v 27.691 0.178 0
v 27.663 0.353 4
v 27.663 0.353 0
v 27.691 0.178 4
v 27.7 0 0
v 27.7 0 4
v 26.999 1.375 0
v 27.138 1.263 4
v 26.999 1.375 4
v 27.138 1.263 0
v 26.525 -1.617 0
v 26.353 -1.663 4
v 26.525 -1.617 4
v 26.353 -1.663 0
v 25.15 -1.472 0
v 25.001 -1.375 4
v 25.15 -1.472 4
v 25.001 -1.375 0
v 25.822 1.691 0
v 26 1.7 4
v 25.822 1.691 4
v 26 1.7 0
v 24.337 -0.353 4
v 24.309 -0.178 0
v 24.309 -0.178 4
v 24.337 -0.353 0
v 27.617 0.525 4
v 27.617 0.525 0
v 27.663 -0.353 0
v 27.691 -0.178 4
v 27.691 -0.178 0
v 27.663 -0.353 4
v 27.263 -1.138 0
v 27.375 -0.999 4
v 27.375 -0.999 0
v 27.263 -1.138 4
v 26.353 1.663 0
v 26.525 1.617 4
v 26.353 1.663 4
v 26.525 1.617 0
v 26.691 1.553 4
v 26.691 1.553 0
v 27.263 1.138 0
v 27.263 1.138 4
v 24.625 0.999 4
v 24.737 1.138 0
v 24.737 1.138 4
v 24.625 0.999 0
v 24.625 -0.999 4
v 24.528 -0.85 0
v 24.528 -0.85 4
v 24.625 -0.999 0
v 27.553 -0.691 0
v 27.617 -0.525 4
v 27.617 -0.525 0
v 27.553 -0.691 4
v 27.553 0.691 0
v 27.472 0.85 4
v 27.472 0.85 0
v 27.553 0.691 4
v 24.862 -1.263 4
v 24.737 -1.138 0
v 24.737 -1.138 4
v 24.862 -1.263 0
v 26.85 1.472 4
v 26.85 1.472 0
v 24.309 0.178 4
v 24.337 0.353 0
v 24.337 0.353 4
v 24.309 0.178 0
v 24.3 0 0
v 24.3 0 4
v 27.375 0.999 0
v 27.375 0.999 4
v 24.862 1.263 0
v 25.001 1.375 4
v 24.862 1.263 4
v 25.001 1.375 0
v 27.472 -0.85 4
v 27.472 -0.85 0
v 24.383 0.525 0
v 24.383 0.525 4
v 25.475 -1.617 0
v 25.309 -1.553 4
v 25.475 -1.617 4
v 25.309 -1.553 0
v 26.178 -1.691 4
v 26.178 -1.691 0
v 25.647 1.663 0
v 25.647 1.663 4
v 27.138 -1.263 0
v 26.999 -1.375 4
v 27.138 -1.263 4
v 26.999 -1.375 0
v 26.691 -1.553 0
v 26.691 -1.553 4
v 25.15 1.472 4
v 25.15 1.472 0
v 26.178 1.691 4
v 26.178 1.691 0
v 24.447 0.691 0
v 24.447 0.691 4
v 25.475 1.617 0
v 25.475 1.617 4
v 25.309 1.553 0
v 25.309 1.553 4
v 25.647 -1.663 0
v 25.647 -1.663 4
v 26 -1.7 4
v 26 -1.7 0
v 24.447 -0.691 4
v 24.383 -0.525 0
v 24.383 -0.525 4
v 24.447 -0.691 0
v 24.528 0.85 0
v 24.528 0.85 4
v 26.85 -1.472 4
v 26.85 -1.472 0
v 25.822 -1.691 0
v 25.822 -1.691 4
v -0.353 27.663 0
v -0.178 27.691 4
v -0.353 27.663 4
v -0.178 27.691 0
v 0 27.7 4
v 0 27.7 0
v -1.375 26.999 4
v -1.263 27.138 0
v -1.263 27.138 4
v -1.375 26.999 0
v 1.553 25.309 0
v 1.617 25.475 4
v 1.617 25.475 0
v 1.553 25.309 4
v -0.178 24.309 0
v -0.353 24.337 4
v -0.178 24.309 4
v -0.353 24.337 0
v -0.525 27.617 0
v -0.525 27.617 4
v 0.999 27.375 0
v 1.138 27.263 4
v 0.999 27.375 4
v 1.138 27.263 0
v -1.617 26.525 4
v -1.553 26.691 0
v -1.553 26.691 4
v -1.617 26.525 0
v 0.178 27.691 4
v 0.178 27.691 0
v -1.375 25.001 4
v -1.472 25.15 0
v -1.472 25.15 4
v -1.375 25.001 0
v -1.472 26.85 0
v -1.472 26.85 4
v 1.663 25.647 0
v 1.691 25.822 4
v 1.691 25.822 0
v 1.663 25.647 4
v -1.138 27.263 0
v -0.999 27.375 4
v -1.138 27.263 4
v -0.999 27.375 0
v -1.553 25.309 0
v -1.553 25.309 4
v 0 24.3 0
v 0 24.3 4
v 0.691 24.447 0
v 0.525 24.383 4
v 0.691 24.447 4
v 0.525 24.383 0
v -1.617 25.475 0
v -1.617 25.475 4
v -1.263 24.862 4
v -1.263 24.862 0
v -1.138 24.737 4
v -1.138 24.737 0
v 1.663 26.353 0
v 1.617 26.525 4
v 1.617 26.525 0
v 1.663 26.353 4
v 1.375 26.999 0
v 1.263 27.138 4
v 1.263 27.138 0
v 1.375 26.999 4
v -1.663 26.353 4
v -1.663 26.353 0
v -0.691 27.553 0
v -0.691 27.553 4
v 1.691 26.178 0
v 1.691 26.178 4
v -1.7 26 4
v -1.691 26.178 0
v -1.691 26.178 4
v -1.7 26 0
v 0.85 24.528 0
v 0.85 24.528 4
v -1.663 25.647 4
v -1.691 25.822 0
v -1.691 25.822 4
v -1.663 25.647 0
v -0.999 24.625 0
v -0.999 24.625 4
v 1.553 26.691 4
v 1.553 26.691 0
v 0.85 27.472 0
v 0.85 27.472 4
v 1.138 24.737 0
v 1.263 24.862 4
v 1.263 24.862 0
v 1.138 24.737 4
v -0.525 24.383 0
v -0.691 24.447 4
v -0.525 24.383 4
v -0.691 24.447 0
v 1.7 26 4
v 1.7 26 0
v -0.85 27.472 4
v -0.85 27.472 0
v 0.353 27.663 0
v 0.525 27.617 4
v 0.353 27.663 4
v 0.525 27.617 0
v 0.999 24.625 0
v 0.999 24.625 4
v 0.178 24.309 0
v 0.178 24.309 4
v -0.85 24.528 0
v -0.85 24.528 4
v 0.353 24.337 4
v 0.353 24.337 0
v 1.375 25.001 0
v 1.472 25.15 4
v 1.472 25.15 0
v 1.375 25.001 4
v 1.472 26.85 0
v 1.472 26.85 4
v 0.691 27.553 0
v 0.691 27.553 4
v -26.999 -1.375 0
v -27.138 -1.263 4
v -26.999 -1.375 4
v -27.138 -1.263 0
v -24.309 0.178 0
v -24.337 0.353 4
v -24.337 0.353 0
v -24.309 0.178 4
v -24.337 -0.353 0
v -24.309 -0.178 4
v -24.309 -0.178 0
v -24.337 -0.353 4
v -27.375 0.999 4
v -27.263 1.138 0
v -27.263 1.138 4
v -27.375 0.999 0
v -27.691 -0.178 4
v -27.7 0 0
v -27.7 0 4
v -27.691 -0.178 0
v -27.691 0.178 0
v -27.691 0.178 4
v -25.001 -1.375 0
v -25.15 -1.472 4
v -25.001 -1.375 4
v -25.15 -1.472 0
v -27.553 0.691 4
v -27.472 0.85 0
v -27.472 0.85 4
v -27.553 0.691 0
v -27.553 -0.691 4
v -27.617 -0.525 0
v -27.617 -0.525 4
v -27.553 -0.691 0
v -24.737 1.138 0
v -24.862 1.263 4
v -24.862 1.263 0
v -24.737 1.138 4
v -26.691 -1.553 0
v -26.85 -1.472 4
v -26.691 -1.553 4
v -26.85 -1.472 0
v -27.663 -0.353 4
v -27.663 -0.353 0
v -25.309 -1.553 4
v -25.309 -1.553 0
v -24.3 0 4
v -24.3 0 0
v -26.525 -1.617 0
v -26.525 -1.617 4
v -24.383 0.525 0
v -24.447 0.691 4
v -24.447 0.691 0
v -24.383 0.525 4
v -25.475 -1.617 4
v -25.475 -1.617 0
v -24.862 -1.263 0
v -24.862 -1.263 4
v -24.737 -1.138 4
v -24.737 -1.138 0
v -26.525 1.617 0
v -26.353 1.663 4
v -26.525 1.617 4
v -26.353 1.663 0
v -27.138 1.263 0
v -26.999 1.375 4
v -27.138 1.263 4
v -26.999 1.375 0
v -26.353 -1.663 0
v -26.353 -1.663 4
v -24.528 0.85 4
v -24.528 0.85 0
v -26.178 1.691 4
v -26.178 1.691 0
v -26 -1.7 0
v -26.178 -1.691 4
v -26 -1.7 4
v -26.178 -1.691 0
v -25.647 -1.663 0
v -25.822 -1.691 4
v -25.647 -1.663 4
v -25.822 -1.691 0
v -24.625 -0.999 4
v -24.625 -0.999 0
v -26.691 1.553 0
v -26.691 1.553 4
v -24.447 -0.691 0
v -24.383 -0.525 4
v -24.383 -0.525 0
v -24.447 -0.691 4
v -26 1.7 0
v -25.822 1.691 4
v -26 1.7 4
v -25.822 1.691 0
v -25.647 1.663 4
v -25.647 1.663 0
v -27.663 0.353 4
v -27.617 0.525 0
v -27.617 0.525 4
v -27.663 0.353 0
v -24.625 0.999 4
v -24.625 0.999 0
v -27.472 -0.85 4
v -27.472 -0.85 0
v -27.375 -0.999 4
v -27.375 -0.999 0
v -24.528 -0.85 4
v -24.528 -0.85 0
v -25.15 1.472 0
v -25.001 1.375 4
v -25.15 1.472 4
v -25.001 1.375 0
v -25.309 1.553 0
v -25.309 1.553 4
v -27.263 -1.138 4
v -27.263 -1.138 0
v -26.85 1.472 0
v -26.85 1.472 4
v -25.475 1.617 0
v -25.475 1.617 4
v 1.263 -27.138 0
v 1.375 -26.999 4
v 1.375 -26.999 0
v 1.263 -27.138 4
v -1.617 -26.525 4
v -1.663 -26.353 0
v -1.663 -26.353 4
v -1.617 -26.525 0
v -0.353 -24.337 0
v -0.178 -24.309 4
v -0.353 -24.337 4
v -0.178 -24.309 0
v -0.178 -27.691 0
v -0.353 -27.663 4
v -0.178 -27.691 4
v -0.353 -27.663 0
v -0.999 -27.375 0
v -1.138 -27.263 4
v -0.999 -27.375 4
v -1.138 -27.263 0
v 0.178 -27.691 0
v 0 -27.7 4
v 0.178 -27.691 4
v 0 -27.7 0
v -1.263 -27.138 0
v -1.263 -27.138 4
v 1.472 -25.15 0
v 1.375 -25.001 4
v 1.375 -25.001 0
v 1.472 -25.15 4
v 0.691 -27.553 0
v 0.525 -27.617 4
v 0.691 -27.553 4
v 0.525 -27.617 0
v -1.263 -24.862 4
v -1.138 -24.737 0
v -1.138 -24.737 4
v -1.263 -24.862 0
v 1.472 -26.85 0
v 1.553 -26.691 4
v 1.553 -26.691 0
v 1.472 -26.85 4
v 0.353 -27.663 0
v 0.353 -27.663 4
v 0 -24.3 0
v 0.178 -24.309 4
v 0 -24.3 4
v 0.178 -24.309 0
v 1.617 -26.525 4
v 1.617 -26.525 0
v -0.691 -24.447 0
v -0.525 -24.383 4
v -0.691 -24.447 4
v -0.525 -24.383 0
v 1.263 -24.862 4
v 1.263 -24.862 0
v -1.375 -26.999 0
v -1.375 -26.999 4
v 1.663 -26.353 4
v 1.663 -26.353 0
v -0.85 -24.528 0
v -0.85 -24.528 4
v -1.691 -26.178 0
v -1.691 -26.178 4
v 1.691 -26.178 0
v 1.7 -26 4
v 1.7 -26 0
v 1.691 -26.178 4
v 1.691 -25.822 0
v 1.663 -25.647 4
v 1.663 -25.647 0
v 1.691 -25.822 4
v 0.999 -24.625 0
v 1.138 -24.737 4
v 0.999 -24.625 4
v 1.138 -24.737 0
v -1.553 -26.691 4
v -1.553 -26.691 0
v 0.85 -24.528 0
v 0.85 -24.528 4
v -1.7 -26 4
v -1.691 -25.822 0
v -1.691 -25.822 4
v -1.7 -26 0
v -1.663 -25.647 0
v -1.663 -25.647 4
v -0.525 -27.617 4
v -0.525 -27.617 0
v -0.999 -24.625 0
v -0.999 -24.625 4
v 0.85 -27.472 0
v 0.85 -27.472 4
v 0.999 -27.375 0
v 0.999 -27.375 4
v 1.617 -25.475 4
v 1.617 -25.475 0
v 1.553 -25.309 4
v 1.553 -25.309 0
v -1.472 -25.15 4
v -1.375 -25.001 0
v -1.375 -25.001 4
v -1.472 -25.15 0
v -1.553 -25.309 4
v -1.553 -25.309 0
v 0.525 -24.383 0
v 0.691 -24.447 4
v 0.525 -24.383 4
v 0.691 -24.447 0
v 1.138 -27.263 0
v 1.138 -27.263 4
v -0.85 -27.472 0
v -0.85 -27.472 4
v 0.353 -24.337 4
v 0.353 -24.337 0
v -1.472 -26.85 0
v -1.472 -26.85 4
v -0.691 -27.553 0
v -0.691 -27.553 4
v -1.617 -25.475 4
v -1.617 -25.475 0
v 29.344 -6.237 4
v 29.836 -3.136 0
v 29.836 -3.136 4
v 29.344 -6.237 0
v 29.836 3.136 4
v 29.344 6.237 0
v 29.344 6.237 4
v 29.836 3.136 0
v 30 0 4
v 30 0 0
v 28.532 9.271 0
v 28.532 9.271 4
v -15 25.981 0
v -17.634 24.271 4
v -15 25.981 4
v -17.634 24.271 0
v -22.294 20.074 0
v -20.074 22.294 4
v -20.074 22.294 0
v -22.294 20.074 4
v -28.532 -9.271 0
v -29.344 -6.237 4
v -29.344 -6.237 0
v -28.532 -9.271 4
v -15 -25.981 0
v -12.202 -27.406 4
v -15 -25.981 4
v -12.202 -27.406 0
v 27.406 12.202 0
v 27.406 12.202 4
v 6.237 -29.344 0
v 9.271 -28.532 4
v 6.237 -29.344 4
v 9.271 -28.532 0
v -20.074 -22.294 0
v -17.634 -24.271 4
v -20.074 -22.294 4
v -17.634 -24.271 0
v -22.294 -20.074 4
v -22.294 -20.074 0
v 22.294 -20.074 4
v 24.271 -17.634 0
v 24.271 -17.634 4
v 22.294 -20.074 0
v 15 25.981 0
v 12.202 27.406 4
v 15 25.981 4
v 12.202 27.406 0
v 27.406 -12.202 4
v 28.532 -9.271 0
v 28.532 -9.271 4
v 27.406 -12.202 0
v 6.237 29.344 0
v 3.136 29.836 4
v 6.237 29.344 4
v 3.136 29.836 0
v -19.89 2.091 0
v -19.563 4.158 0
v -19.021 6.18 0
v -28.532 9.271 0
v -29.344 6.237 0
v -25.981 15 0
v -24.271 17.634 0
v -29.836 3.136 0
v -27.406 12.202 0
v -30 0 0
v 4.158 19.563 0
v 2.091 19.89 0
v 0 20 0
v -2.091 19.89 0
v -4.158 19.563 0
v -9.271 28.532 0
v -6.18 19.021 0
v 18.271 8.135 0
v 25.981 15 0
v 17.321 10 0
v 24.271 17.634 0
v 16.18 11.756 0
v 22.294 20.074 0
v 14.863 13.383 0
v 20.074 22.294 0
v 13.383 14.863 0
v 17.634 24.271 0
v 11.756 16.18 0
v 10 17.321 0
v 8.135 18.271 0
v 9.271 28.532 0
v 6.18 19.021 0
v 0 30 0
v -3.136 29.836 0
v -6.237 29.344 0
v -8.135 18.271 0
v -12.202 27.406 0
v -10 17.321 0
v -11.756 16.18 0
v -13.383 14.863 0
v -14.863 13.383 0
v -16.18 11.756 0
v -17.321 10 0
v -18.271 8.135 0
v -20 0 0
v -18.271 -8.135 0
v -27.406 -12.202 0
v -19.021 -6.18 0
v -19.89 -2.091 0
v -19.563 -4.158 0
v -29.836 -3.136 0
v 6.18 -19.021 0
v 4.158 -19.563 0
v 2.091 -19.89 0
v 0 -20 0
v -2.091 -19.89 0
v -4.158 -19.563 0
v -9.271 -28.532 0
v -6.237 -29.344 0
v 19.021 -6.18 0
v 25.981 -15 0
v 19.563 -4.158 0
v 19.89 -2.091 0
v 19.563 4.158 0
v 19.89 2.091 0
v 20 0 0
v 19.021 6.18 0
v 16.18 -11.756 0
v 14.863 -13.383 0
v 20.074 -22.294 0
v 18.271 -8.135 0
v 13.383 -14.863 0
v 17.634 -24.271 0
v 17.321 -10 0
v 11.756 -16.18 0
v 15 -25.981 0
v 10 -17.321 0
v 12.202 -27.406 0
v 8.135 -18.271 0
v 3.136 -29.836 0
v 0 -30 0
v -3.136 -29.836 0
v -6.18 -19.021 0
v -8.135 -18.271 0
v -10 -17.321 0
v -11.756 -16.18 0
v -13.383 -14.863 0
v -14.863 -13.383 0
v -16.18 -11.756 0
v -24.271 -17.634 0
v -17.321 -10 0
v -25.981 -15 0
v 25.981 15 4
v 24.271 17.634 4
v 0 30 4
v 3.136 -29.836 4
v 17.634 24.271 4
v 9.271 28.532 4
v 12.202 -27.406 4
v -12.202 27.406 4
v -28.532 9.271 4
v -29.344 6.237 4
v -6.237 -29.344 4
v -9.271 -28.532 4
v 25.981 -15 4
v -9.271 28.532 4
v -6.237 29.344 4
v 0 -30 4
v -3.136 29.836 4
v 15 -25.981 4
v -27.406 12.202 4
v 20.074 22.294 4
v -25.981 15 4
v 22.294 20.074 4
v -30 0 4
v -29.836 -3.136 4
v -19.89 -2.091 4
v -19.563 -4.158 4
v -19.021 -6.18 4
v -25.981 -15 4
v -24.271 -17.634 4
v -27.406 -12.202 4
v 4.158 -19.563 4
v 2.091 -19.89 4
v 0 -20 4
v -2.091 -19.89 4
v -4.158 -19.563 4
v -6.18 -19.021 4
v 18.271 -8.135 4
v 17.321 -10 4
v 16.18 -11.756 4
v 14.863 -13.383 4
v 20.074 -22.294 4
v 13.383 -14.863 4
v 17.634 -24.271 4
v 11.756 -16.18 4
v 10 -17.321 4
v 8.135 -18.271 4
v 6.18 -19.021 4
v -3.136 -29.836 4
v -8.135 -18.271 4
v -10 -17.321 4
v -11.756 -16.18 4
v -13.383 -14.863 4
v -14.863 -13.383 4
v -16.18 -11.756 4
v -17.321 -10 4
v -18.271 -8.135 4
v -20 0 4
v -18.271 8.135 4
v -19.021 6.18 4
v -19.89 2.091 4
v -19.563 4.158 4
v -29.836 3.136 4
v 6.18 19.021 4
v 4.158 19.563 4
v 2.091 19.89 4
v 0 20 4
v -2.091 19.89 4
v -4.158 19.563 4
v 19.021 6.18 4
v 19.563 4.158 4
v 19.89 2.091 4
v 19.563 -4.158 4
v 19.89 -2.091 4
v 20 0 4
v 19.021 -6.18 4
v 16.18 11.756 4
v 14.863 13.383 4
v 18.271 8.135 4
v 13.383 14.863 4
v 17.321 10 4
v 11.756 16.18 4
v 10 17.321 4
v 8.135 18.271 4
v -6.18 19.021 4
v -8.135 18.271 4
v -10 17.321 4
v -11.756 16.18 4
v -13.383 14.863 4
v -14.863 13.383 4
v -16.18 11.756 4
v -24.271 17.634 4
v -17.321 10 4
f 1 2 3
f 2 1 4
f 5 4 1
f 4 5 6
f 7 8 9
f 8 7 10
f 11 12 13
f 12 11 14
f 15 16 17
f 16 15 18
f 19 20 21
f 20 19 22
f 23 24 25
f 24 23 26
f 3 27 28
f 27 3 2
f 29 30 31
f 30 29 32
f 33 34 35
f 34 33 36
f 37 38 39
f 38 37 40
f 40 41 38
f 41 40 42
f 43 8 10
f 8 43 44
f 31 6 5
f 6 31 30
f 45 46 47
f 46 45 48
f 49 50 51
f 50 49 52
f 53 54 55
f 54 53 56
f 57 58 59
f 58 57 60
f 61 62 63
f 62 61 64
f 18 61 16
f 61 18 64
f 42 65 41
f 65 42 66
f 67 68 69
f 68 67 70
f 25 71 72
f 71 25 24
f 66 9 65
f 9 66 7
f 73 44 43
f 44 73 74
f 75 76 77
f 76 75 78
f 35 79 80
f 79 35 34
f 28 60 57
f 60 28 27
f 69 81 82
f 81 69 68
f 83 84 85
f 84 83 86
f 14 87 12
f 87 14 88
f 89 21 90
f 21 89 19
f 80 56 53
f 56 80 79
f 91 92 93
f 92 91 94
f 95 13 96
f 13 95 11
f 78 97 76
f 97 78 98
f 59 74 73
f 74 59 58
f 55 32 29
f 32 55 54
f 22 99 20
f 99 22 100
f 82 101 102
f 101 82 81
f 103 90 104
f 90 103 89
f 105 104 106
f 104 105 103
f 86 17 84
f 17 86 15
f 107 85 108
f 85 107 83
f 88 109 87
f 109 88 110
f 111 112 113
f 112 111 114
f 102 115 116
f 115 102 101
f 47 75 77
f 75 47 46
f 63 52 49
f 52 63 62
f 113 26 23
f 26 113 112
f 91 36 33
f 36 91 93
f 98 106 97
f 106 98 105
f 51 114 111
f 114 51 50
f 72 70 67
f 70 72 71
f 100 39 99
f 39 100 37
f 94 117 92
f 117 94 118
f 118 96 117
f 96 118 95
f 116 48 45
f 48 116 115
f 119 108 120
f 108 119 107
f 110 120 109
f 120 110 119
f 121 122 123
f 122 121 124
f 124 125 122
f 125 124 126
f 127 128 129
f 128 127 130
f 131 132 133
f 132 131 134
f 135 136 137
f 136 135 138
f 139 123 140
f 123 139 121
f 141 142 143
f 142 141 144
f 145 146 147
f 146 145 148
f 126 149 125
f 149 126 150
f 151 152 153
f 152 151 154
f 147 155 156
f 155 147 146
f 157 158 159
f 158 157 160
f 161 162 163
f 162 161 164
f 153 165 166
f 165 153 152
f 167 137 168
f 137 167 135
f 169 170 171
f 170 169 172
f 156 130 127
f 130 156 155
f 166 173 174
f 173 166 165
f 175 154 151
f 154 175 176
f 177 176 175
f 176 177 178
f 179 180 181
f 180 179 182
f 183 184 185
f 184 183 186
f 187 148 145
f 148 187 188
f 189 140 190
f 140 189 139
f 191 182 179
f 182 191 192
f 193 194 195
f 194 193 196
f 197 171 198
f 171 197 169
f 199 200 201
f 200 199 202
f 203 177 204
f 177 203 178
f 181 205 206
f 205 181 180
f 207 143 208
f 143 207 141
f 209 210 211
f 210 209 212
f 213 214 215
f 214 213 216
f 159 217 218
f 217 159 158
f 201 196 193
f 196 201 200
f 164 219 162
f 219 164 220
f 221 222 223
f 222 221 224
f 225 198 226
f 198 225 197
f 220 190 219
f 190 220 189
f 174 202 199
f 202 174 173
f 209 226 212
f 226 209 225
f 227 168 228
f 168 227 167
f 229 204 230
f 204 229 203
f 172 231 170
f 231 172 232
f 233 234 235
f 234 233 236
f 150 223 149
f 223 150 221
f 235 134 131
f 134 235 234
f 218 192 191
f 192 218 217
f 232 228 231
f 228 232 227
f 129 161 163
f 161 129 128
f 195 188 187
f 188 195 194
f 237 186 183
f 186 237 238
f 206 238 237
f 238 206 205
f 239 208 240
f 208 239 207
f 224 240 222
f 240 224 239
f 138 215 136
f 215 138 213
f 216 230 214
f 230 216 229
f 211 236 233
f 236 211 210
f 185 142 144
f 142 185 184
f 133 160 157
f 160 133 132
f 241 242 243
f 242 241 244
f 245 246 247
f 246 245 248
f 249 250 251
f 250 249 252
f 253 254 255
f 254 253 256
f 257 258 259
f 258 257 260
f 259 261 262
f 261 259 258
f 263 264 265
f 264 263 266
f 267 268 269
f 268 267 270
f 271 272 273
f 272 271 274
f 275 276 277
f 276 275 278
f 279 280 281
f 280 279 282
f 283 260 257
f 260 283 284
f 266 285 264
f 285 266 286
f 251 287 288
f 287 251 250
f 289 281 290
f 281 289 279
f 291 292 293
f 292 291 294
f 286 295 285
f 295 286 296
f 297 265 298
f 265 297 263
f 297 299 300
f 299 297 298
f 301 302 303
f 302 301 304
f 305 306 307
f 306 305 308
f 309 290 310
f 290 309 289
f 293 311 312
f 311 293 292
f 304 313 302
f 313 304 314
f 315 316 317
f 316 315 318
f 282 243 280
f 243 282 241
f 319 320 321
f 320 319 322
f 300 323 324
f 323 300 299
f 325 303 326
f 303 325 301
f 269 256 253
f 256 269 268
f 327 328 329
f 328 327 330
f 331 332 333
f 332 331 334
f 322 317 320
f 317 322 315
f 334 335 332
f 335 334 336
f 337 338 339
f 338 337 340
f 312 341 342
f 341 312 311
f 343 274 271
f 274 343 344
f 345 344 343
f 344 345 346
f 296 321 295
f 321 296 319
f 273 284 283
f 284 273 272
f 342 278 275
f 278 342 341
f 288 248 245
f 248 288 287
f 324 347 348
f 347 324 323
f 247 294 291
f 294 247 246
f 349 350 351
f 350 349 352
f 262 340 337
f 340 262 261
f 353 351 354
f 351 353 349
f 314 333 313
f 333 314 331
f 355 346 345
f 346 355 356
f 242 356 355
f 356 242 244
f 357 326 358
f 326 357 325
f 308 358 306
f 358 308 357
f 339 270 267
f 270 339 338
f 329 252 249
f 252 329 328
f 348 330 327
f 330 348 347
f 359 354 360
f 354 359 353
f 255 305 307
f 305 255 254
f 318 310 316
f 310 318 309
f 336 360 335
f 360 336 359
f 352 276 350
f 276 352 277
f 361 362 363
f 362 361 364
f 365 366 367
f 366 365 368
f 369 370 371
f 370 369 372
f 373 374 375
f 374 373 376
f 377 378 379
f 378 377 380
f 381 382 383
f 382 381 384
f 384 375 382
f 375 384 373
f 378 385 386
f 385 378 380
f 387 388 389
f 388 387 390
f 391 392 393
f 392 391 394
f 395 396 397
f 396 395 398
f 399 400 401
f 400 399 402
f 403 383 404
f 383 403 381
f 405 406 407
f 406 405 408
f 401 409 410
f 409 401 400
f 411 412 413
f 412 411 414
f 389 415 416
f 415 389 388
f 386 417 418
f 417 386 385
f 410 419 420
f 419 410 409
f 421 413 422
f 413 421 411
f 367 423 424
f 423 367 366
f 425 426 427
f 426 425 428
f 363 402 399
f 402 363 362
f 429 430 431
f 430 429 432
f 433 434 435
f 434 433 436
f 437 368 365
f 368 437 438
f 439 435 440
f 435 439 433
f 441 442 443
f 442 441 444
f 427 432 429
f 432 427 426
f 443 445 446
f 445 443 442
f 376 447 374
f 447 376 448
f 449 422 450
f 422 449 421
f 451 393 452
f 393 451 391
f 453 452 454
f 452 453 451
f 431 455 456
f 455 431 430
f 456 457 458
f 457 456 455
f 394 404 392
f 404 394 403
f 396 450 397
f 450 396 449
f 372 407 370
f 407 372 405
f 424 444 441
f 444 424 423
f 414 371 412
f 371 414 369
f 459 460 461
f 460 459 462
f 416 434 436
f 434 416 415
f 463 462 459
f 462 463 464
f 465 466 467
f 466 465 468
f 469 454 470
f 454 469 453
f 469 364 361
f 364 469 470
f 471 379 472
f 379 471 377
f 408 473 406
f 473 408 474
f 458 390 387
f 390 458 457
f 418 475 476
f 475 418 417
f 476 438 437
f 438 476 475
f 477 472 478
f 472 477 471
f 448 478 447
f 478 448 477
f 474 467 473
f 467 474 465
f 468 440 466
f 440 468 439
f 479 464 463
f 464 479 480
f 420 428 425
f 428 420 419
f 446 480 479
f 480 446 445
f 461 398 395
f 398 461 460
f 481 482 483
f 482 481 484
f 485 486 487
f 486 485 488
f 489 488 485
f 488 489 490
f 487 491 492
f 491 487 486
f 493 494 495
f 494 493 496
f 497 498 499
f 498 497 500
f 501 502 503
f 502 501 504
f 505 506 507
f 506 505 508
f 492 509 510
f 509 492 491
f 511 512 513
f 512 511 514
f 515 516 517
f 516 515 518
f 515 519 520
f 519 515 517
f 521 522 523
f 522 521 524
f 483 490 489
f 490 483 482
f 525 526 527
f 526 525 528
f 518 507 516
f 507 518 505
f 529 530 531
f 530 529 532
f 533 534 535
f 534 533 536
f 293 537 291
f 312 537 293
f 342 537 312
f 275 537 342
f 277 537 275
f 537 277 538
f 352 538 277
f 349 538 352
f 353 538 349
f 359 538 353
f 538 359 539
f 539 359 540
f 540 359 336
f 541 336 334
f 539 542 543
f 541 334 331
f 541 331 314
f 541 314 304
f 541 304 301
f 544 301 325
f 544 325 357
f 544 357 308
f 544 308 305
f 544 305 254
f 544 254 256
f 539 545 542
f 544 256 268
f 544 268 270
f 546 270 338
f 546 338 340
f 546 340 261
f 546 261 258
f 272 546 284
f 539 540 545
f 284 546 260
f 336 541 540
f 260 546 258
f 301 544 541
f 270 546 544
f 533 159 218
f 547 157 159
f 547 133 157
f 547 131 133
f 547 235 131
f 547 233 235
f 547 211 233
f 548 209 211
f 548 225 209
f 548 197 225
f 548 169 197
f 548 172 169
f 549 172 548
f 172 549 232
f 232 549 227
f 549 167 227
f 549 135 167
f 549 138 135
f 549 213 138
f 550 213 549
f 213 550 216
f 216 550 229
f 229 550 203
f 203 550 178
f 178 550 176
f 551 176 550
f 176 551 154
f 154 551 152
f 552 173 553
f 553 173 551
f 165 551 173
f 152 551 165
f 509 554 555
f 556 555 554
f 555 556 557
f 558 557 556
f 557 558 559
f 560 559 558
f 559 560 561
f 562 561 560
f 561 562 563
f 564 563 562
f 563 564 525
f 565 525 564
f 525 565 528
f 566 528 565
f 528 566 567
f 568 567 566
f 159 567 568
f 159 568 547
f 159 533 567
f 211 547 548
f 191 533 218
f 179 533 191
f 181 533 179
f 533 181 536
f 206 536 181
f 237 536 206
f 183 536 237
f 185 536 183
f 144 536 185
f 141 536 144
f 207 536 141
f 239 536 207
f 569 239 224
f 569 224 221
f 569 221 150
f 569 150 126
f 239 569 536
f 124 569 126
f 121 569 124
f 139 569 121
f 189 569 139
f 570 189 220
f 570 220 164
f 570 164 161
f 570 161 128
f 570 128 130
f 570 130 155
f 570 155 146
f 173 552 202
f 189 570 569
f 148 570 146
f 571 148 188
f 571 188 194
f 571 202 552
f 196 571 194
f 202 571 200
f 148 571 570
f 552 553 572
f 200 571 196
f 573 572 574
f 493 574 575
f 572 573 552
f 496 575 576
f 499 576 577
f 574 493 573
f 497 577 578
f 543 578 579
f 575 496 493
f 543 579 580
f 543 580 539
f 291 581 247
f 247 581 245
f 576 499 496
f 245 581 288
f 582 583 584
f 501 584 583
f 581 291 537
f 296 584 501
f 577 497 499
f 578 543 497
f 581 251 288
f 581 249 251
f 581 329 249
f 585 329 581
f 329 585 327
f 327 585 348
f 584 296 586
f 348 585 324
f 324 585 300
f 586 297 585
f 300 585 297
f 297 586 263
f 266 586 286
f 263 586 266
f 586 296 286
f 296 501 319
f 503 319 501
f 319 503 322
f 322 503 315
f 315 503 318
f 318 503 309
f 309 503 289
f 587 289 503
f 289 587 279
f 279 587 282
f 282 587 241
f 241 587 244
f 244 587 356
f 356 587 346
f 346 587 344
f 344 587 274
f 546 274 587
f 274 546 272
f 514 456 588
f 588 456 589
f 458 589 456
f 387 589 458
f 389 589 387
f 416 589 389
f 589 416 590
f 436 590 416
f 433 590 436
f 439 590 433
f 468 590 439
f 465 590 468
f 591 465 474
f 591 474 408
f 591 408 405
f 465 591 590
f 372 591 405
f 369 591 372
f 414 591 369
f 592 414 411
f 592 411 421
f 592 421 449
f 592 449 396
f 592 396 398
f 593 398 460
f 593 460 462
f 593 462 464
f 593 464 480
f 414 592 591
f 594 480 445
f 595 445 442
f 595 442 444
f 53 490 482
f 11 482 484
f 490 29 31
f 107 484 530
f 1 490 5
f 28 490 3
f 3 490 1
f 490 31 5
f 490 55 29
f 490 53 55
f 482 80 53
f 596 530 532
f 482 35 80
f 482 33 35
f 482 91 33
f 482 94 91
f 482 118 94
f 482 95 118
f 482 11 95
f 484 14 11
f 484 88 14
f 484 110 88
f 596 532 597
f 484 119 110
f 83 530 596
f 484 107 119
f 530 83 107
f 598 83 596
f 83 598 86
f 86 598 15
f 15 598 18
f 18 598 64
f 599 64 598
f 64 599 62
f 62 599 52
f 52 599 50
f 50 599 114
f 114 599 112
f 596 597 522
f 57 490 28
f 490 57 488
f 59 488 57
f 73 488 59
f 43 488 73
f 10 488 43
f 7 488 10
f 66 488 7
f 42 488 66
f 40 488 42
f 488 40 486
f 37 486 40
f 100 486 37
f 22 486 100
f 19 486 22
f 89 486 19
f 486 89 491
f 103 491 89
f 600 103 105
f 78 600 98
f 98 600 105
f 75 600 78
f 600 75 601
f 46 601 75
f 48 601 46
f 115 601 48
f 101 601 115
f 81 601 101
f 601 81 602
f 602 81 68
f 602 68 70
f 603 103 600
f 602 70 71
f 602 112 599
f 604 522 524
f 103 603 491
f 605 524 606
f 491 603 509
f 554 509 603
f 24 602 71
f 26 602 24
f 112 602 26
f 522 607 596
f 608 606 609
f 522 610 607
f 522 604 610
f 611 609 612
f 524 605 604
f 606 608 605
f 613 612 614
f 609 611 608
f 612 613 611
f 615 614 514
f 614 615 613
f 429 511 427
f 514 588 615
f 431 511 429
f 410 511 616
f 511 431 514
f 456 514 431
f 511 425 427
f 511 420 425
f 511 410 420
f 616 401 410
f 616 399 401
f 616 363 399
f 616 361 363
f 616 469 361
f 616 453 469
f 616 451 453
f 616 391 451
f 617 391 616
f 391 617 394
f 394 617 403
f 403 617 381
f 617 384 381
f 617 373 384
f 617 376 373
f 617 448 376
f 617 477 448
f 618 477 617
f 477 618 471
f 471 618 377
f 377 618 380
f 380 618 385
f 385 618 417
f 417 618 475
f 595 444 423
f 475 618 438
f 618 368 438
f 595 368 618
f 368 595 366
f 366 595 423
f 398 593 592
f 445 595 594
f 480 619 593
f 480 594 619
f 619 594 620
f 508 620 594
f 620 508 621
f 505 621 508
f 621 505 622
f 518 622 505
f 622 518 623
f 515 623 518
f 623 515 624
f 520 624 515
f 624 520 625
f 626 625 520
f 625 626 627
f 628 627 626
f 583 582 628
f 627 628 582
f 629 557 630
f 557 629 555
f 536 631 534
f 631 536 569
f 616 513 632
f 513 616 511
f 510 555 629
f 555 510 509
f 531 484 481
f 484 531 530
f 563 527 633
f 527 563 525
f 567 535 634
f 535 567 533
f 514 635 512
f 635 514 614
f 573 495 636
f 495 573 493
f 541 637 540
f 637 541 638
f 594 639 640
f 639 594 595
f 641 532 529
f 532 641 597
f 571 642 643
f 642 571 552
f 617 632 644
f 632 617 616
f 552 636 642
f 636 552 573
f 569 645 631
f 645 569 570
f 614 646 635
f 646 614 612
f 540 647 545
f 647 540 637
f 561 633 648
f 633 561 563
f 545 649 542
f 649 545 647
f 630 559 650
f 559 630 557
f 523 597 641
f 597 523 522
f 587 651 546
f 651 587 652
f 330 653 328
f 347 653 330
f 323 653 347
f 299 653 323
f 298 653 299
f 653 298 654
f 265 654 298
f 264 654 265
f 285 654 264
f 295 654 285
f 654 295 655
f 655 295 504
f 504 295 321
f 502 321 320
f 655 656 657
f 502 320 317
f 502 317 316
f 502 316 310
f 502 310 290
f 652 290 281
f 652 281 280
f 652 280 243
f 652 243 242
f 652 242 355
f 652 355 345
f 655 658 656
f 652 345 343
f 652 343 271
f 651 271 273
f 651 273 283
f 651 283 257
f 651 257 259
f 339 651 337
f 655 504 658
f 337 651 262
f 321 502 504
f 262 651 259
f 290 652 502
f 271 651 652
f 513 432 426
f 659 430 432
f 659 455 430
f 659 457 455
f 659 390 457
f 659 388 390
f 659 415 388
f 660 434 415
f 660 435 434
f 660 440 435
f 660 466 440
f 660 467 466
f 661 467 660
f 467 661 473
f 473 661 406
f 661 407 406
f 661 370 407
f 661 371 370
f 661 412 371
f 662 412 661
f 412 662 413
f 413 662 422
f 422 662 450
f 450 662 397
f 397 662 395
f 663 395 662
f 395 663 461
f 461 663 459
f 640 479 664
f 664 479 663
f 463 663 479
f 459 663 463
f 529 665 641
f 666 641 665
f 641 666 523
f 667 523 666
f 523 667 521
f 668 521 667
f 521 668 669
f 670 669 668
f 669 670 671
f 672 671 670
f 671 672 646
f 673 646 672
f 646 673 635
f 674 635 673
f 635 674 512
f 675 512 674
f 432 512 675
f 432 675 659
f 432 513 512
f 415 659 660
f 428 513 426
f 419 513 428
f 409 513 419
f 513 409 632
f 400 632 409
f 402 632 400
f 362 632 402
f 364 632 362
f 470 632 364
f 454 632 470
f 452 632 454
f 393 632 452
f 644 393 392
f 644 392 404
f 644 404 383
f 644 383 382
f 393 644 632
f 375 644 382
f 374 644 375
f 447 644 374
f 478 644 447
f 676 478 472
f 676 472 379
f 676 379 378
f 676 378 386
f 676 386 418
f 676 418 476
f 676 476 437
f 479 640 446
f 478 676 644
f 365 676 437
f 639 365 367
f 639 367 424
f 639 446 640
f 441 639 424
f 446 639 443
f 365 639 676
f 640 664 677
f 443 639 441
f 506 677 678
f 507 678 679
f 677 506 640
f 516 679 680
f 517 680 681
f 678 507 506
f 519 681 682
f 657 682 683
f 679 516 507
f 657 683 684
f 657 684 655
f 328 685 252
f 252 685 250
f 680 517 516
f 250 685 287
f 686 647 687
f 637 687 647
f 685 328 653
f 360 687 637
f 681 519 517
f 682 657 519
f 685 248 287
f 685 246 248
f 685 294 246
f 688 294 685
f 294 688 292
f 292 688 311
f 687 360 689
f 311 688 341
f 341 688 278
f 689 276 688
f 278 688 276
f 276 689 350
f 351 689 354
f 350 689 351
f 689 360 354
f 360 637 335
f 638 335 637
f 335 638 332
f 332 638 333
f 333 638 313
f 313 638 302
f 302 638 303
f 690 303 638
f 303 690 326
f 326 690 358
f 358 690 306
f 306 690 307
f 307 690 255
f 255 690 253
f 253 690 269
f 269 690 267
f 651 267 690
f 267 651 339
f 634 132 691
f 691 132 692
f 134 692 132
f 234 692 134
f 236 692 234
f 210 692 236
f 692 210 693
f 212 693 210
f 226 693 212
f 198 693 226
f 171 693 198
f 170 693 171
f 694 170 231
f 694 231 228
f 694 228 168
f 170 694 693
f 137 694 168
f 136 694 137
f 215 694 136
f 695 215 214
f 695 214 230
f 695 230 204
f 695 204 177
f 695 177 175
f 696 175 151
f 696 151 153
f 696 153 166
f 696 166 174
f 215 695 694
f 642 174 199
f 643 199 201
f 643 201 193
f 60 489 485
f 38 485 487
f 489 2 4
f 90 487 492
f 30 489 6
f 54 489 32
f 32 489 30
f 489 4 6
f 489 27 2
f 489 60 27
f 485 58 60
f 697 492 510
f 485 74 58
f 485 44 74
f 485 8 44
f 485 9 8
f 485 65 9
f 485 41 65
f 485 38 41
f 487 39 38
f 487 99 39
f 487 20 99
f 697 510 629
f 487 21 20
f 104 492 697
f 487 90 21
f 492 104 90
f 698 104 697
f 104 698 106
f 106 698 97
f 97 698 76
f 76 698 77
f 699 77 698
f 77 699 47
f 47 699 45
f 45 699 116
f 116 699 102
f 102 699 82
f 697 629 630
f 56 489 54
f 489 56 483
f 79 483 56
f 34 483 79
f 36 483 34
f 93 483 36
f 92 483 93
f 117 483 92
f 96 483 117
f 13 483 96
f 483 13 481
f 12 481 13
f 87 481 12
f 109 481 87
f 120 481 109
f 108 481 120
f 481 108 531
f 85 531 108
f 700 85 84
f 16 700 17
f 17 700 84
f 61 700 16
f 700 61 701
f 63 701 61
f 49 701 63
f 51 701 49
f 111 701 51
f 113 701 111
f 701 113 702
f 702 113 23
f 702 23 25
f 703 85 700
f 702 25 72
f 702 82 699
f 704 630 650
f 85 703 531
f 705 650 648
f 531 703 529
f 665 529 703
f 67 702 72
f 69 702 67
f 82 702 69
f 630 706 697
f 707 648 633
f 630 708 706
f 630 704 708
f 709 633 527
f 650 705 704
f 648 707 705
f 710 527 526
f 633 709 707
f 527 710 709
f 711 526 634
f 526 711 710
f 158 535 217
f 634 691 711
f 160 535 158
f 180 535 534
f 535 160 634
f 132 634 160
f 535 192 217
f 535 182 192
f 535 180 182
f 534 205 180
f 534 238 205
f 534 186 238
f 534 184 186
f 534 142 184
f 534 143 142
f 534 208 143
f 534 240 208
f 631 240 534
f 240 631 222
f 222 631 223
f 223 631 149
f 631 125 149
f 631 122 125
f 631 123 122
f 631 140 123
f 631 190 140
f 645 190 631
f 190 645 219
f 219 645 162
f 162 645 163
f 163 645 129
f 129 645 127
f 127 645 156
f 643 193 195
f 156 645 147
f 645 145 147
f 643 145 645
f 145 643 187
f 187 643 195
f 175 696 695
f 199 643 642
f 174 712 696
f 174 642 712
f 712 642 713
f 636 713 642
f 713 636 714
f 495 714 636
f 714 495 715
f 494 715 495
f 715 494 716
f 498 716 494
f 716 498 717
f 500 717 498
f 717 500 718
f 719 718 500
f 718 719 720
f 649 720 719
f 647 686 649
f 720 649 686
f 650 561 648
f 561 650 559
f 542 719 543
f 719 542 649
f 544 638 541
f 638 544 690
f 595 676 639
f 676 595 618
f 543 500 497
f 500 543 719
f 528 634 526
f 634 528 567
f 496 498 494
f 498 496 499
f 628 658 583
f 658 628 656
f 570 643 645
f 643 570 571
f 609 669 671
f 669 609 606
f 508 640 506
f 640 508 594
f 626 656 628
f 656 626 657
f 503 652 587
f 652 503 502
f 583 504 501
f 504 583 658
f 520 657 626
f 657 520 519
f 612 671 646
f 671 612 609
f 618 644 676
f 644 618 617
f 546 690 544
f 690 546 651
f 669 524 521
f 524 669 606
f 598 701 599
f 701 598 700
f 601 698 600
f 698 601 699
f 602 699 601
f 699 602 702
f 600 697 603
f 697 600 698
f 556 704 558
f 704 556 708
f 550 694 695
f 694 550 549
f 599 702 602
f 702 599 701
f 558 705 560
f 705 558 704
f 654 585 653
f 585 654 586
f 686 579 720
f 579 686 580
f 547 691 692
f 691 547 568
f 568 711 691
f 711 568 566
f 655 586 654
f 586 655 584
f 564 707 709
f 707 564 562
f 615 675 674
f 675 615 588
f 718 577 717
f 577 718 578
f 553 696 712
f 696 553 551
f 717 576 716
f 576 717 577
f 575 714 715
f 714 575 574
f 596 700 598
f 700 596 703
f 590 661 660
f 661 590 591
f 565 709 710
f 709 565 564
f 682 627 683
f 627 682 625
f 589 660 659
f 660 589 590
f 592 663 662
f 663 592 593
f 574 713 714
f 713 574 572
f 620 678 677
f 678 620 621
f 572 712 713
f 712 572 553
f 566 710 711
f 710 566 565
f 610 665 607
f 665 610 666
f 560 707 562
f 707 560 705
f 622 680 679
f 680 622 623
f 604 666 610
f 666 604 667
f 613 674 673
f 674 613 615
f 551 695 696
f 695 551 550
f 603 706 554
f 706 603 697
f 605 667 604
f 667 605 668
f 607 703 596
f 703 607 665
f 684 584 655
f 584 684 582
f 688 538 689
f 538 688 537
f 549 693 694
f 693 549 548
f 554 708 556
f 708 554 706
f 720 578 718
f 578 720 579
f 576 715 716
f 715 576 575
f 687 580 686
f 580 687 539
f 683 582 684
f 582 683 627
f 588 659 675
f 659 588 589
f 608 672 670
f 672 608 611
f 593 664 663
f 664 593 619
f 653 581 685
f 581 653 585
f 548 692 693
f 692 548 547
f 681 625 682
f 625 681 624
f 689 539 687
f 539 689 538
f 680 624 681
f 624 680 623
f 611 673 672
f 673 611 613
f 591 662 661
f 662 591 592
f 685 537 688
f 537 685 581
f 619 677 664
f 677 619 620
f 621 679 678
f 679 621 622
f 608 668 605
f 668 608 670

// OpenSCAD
// Bearing retaining ring.
$fn = 60;
eps = 0.02;
bearing_d = 40;
outer_d = 60;
thickness = 4;
difference() {
    cylinder(d=outer_d,h=thickness);
    translate([0,0,-eps]) cylinder(d=bearing_d,h=thickness+2*eps);
    for (i=[0:3]) rotate([0,0,i*90]) translate([outer_d/2-4,0,-eps]) cylinder(d=3.4,h=thickness+2*eps);
}
